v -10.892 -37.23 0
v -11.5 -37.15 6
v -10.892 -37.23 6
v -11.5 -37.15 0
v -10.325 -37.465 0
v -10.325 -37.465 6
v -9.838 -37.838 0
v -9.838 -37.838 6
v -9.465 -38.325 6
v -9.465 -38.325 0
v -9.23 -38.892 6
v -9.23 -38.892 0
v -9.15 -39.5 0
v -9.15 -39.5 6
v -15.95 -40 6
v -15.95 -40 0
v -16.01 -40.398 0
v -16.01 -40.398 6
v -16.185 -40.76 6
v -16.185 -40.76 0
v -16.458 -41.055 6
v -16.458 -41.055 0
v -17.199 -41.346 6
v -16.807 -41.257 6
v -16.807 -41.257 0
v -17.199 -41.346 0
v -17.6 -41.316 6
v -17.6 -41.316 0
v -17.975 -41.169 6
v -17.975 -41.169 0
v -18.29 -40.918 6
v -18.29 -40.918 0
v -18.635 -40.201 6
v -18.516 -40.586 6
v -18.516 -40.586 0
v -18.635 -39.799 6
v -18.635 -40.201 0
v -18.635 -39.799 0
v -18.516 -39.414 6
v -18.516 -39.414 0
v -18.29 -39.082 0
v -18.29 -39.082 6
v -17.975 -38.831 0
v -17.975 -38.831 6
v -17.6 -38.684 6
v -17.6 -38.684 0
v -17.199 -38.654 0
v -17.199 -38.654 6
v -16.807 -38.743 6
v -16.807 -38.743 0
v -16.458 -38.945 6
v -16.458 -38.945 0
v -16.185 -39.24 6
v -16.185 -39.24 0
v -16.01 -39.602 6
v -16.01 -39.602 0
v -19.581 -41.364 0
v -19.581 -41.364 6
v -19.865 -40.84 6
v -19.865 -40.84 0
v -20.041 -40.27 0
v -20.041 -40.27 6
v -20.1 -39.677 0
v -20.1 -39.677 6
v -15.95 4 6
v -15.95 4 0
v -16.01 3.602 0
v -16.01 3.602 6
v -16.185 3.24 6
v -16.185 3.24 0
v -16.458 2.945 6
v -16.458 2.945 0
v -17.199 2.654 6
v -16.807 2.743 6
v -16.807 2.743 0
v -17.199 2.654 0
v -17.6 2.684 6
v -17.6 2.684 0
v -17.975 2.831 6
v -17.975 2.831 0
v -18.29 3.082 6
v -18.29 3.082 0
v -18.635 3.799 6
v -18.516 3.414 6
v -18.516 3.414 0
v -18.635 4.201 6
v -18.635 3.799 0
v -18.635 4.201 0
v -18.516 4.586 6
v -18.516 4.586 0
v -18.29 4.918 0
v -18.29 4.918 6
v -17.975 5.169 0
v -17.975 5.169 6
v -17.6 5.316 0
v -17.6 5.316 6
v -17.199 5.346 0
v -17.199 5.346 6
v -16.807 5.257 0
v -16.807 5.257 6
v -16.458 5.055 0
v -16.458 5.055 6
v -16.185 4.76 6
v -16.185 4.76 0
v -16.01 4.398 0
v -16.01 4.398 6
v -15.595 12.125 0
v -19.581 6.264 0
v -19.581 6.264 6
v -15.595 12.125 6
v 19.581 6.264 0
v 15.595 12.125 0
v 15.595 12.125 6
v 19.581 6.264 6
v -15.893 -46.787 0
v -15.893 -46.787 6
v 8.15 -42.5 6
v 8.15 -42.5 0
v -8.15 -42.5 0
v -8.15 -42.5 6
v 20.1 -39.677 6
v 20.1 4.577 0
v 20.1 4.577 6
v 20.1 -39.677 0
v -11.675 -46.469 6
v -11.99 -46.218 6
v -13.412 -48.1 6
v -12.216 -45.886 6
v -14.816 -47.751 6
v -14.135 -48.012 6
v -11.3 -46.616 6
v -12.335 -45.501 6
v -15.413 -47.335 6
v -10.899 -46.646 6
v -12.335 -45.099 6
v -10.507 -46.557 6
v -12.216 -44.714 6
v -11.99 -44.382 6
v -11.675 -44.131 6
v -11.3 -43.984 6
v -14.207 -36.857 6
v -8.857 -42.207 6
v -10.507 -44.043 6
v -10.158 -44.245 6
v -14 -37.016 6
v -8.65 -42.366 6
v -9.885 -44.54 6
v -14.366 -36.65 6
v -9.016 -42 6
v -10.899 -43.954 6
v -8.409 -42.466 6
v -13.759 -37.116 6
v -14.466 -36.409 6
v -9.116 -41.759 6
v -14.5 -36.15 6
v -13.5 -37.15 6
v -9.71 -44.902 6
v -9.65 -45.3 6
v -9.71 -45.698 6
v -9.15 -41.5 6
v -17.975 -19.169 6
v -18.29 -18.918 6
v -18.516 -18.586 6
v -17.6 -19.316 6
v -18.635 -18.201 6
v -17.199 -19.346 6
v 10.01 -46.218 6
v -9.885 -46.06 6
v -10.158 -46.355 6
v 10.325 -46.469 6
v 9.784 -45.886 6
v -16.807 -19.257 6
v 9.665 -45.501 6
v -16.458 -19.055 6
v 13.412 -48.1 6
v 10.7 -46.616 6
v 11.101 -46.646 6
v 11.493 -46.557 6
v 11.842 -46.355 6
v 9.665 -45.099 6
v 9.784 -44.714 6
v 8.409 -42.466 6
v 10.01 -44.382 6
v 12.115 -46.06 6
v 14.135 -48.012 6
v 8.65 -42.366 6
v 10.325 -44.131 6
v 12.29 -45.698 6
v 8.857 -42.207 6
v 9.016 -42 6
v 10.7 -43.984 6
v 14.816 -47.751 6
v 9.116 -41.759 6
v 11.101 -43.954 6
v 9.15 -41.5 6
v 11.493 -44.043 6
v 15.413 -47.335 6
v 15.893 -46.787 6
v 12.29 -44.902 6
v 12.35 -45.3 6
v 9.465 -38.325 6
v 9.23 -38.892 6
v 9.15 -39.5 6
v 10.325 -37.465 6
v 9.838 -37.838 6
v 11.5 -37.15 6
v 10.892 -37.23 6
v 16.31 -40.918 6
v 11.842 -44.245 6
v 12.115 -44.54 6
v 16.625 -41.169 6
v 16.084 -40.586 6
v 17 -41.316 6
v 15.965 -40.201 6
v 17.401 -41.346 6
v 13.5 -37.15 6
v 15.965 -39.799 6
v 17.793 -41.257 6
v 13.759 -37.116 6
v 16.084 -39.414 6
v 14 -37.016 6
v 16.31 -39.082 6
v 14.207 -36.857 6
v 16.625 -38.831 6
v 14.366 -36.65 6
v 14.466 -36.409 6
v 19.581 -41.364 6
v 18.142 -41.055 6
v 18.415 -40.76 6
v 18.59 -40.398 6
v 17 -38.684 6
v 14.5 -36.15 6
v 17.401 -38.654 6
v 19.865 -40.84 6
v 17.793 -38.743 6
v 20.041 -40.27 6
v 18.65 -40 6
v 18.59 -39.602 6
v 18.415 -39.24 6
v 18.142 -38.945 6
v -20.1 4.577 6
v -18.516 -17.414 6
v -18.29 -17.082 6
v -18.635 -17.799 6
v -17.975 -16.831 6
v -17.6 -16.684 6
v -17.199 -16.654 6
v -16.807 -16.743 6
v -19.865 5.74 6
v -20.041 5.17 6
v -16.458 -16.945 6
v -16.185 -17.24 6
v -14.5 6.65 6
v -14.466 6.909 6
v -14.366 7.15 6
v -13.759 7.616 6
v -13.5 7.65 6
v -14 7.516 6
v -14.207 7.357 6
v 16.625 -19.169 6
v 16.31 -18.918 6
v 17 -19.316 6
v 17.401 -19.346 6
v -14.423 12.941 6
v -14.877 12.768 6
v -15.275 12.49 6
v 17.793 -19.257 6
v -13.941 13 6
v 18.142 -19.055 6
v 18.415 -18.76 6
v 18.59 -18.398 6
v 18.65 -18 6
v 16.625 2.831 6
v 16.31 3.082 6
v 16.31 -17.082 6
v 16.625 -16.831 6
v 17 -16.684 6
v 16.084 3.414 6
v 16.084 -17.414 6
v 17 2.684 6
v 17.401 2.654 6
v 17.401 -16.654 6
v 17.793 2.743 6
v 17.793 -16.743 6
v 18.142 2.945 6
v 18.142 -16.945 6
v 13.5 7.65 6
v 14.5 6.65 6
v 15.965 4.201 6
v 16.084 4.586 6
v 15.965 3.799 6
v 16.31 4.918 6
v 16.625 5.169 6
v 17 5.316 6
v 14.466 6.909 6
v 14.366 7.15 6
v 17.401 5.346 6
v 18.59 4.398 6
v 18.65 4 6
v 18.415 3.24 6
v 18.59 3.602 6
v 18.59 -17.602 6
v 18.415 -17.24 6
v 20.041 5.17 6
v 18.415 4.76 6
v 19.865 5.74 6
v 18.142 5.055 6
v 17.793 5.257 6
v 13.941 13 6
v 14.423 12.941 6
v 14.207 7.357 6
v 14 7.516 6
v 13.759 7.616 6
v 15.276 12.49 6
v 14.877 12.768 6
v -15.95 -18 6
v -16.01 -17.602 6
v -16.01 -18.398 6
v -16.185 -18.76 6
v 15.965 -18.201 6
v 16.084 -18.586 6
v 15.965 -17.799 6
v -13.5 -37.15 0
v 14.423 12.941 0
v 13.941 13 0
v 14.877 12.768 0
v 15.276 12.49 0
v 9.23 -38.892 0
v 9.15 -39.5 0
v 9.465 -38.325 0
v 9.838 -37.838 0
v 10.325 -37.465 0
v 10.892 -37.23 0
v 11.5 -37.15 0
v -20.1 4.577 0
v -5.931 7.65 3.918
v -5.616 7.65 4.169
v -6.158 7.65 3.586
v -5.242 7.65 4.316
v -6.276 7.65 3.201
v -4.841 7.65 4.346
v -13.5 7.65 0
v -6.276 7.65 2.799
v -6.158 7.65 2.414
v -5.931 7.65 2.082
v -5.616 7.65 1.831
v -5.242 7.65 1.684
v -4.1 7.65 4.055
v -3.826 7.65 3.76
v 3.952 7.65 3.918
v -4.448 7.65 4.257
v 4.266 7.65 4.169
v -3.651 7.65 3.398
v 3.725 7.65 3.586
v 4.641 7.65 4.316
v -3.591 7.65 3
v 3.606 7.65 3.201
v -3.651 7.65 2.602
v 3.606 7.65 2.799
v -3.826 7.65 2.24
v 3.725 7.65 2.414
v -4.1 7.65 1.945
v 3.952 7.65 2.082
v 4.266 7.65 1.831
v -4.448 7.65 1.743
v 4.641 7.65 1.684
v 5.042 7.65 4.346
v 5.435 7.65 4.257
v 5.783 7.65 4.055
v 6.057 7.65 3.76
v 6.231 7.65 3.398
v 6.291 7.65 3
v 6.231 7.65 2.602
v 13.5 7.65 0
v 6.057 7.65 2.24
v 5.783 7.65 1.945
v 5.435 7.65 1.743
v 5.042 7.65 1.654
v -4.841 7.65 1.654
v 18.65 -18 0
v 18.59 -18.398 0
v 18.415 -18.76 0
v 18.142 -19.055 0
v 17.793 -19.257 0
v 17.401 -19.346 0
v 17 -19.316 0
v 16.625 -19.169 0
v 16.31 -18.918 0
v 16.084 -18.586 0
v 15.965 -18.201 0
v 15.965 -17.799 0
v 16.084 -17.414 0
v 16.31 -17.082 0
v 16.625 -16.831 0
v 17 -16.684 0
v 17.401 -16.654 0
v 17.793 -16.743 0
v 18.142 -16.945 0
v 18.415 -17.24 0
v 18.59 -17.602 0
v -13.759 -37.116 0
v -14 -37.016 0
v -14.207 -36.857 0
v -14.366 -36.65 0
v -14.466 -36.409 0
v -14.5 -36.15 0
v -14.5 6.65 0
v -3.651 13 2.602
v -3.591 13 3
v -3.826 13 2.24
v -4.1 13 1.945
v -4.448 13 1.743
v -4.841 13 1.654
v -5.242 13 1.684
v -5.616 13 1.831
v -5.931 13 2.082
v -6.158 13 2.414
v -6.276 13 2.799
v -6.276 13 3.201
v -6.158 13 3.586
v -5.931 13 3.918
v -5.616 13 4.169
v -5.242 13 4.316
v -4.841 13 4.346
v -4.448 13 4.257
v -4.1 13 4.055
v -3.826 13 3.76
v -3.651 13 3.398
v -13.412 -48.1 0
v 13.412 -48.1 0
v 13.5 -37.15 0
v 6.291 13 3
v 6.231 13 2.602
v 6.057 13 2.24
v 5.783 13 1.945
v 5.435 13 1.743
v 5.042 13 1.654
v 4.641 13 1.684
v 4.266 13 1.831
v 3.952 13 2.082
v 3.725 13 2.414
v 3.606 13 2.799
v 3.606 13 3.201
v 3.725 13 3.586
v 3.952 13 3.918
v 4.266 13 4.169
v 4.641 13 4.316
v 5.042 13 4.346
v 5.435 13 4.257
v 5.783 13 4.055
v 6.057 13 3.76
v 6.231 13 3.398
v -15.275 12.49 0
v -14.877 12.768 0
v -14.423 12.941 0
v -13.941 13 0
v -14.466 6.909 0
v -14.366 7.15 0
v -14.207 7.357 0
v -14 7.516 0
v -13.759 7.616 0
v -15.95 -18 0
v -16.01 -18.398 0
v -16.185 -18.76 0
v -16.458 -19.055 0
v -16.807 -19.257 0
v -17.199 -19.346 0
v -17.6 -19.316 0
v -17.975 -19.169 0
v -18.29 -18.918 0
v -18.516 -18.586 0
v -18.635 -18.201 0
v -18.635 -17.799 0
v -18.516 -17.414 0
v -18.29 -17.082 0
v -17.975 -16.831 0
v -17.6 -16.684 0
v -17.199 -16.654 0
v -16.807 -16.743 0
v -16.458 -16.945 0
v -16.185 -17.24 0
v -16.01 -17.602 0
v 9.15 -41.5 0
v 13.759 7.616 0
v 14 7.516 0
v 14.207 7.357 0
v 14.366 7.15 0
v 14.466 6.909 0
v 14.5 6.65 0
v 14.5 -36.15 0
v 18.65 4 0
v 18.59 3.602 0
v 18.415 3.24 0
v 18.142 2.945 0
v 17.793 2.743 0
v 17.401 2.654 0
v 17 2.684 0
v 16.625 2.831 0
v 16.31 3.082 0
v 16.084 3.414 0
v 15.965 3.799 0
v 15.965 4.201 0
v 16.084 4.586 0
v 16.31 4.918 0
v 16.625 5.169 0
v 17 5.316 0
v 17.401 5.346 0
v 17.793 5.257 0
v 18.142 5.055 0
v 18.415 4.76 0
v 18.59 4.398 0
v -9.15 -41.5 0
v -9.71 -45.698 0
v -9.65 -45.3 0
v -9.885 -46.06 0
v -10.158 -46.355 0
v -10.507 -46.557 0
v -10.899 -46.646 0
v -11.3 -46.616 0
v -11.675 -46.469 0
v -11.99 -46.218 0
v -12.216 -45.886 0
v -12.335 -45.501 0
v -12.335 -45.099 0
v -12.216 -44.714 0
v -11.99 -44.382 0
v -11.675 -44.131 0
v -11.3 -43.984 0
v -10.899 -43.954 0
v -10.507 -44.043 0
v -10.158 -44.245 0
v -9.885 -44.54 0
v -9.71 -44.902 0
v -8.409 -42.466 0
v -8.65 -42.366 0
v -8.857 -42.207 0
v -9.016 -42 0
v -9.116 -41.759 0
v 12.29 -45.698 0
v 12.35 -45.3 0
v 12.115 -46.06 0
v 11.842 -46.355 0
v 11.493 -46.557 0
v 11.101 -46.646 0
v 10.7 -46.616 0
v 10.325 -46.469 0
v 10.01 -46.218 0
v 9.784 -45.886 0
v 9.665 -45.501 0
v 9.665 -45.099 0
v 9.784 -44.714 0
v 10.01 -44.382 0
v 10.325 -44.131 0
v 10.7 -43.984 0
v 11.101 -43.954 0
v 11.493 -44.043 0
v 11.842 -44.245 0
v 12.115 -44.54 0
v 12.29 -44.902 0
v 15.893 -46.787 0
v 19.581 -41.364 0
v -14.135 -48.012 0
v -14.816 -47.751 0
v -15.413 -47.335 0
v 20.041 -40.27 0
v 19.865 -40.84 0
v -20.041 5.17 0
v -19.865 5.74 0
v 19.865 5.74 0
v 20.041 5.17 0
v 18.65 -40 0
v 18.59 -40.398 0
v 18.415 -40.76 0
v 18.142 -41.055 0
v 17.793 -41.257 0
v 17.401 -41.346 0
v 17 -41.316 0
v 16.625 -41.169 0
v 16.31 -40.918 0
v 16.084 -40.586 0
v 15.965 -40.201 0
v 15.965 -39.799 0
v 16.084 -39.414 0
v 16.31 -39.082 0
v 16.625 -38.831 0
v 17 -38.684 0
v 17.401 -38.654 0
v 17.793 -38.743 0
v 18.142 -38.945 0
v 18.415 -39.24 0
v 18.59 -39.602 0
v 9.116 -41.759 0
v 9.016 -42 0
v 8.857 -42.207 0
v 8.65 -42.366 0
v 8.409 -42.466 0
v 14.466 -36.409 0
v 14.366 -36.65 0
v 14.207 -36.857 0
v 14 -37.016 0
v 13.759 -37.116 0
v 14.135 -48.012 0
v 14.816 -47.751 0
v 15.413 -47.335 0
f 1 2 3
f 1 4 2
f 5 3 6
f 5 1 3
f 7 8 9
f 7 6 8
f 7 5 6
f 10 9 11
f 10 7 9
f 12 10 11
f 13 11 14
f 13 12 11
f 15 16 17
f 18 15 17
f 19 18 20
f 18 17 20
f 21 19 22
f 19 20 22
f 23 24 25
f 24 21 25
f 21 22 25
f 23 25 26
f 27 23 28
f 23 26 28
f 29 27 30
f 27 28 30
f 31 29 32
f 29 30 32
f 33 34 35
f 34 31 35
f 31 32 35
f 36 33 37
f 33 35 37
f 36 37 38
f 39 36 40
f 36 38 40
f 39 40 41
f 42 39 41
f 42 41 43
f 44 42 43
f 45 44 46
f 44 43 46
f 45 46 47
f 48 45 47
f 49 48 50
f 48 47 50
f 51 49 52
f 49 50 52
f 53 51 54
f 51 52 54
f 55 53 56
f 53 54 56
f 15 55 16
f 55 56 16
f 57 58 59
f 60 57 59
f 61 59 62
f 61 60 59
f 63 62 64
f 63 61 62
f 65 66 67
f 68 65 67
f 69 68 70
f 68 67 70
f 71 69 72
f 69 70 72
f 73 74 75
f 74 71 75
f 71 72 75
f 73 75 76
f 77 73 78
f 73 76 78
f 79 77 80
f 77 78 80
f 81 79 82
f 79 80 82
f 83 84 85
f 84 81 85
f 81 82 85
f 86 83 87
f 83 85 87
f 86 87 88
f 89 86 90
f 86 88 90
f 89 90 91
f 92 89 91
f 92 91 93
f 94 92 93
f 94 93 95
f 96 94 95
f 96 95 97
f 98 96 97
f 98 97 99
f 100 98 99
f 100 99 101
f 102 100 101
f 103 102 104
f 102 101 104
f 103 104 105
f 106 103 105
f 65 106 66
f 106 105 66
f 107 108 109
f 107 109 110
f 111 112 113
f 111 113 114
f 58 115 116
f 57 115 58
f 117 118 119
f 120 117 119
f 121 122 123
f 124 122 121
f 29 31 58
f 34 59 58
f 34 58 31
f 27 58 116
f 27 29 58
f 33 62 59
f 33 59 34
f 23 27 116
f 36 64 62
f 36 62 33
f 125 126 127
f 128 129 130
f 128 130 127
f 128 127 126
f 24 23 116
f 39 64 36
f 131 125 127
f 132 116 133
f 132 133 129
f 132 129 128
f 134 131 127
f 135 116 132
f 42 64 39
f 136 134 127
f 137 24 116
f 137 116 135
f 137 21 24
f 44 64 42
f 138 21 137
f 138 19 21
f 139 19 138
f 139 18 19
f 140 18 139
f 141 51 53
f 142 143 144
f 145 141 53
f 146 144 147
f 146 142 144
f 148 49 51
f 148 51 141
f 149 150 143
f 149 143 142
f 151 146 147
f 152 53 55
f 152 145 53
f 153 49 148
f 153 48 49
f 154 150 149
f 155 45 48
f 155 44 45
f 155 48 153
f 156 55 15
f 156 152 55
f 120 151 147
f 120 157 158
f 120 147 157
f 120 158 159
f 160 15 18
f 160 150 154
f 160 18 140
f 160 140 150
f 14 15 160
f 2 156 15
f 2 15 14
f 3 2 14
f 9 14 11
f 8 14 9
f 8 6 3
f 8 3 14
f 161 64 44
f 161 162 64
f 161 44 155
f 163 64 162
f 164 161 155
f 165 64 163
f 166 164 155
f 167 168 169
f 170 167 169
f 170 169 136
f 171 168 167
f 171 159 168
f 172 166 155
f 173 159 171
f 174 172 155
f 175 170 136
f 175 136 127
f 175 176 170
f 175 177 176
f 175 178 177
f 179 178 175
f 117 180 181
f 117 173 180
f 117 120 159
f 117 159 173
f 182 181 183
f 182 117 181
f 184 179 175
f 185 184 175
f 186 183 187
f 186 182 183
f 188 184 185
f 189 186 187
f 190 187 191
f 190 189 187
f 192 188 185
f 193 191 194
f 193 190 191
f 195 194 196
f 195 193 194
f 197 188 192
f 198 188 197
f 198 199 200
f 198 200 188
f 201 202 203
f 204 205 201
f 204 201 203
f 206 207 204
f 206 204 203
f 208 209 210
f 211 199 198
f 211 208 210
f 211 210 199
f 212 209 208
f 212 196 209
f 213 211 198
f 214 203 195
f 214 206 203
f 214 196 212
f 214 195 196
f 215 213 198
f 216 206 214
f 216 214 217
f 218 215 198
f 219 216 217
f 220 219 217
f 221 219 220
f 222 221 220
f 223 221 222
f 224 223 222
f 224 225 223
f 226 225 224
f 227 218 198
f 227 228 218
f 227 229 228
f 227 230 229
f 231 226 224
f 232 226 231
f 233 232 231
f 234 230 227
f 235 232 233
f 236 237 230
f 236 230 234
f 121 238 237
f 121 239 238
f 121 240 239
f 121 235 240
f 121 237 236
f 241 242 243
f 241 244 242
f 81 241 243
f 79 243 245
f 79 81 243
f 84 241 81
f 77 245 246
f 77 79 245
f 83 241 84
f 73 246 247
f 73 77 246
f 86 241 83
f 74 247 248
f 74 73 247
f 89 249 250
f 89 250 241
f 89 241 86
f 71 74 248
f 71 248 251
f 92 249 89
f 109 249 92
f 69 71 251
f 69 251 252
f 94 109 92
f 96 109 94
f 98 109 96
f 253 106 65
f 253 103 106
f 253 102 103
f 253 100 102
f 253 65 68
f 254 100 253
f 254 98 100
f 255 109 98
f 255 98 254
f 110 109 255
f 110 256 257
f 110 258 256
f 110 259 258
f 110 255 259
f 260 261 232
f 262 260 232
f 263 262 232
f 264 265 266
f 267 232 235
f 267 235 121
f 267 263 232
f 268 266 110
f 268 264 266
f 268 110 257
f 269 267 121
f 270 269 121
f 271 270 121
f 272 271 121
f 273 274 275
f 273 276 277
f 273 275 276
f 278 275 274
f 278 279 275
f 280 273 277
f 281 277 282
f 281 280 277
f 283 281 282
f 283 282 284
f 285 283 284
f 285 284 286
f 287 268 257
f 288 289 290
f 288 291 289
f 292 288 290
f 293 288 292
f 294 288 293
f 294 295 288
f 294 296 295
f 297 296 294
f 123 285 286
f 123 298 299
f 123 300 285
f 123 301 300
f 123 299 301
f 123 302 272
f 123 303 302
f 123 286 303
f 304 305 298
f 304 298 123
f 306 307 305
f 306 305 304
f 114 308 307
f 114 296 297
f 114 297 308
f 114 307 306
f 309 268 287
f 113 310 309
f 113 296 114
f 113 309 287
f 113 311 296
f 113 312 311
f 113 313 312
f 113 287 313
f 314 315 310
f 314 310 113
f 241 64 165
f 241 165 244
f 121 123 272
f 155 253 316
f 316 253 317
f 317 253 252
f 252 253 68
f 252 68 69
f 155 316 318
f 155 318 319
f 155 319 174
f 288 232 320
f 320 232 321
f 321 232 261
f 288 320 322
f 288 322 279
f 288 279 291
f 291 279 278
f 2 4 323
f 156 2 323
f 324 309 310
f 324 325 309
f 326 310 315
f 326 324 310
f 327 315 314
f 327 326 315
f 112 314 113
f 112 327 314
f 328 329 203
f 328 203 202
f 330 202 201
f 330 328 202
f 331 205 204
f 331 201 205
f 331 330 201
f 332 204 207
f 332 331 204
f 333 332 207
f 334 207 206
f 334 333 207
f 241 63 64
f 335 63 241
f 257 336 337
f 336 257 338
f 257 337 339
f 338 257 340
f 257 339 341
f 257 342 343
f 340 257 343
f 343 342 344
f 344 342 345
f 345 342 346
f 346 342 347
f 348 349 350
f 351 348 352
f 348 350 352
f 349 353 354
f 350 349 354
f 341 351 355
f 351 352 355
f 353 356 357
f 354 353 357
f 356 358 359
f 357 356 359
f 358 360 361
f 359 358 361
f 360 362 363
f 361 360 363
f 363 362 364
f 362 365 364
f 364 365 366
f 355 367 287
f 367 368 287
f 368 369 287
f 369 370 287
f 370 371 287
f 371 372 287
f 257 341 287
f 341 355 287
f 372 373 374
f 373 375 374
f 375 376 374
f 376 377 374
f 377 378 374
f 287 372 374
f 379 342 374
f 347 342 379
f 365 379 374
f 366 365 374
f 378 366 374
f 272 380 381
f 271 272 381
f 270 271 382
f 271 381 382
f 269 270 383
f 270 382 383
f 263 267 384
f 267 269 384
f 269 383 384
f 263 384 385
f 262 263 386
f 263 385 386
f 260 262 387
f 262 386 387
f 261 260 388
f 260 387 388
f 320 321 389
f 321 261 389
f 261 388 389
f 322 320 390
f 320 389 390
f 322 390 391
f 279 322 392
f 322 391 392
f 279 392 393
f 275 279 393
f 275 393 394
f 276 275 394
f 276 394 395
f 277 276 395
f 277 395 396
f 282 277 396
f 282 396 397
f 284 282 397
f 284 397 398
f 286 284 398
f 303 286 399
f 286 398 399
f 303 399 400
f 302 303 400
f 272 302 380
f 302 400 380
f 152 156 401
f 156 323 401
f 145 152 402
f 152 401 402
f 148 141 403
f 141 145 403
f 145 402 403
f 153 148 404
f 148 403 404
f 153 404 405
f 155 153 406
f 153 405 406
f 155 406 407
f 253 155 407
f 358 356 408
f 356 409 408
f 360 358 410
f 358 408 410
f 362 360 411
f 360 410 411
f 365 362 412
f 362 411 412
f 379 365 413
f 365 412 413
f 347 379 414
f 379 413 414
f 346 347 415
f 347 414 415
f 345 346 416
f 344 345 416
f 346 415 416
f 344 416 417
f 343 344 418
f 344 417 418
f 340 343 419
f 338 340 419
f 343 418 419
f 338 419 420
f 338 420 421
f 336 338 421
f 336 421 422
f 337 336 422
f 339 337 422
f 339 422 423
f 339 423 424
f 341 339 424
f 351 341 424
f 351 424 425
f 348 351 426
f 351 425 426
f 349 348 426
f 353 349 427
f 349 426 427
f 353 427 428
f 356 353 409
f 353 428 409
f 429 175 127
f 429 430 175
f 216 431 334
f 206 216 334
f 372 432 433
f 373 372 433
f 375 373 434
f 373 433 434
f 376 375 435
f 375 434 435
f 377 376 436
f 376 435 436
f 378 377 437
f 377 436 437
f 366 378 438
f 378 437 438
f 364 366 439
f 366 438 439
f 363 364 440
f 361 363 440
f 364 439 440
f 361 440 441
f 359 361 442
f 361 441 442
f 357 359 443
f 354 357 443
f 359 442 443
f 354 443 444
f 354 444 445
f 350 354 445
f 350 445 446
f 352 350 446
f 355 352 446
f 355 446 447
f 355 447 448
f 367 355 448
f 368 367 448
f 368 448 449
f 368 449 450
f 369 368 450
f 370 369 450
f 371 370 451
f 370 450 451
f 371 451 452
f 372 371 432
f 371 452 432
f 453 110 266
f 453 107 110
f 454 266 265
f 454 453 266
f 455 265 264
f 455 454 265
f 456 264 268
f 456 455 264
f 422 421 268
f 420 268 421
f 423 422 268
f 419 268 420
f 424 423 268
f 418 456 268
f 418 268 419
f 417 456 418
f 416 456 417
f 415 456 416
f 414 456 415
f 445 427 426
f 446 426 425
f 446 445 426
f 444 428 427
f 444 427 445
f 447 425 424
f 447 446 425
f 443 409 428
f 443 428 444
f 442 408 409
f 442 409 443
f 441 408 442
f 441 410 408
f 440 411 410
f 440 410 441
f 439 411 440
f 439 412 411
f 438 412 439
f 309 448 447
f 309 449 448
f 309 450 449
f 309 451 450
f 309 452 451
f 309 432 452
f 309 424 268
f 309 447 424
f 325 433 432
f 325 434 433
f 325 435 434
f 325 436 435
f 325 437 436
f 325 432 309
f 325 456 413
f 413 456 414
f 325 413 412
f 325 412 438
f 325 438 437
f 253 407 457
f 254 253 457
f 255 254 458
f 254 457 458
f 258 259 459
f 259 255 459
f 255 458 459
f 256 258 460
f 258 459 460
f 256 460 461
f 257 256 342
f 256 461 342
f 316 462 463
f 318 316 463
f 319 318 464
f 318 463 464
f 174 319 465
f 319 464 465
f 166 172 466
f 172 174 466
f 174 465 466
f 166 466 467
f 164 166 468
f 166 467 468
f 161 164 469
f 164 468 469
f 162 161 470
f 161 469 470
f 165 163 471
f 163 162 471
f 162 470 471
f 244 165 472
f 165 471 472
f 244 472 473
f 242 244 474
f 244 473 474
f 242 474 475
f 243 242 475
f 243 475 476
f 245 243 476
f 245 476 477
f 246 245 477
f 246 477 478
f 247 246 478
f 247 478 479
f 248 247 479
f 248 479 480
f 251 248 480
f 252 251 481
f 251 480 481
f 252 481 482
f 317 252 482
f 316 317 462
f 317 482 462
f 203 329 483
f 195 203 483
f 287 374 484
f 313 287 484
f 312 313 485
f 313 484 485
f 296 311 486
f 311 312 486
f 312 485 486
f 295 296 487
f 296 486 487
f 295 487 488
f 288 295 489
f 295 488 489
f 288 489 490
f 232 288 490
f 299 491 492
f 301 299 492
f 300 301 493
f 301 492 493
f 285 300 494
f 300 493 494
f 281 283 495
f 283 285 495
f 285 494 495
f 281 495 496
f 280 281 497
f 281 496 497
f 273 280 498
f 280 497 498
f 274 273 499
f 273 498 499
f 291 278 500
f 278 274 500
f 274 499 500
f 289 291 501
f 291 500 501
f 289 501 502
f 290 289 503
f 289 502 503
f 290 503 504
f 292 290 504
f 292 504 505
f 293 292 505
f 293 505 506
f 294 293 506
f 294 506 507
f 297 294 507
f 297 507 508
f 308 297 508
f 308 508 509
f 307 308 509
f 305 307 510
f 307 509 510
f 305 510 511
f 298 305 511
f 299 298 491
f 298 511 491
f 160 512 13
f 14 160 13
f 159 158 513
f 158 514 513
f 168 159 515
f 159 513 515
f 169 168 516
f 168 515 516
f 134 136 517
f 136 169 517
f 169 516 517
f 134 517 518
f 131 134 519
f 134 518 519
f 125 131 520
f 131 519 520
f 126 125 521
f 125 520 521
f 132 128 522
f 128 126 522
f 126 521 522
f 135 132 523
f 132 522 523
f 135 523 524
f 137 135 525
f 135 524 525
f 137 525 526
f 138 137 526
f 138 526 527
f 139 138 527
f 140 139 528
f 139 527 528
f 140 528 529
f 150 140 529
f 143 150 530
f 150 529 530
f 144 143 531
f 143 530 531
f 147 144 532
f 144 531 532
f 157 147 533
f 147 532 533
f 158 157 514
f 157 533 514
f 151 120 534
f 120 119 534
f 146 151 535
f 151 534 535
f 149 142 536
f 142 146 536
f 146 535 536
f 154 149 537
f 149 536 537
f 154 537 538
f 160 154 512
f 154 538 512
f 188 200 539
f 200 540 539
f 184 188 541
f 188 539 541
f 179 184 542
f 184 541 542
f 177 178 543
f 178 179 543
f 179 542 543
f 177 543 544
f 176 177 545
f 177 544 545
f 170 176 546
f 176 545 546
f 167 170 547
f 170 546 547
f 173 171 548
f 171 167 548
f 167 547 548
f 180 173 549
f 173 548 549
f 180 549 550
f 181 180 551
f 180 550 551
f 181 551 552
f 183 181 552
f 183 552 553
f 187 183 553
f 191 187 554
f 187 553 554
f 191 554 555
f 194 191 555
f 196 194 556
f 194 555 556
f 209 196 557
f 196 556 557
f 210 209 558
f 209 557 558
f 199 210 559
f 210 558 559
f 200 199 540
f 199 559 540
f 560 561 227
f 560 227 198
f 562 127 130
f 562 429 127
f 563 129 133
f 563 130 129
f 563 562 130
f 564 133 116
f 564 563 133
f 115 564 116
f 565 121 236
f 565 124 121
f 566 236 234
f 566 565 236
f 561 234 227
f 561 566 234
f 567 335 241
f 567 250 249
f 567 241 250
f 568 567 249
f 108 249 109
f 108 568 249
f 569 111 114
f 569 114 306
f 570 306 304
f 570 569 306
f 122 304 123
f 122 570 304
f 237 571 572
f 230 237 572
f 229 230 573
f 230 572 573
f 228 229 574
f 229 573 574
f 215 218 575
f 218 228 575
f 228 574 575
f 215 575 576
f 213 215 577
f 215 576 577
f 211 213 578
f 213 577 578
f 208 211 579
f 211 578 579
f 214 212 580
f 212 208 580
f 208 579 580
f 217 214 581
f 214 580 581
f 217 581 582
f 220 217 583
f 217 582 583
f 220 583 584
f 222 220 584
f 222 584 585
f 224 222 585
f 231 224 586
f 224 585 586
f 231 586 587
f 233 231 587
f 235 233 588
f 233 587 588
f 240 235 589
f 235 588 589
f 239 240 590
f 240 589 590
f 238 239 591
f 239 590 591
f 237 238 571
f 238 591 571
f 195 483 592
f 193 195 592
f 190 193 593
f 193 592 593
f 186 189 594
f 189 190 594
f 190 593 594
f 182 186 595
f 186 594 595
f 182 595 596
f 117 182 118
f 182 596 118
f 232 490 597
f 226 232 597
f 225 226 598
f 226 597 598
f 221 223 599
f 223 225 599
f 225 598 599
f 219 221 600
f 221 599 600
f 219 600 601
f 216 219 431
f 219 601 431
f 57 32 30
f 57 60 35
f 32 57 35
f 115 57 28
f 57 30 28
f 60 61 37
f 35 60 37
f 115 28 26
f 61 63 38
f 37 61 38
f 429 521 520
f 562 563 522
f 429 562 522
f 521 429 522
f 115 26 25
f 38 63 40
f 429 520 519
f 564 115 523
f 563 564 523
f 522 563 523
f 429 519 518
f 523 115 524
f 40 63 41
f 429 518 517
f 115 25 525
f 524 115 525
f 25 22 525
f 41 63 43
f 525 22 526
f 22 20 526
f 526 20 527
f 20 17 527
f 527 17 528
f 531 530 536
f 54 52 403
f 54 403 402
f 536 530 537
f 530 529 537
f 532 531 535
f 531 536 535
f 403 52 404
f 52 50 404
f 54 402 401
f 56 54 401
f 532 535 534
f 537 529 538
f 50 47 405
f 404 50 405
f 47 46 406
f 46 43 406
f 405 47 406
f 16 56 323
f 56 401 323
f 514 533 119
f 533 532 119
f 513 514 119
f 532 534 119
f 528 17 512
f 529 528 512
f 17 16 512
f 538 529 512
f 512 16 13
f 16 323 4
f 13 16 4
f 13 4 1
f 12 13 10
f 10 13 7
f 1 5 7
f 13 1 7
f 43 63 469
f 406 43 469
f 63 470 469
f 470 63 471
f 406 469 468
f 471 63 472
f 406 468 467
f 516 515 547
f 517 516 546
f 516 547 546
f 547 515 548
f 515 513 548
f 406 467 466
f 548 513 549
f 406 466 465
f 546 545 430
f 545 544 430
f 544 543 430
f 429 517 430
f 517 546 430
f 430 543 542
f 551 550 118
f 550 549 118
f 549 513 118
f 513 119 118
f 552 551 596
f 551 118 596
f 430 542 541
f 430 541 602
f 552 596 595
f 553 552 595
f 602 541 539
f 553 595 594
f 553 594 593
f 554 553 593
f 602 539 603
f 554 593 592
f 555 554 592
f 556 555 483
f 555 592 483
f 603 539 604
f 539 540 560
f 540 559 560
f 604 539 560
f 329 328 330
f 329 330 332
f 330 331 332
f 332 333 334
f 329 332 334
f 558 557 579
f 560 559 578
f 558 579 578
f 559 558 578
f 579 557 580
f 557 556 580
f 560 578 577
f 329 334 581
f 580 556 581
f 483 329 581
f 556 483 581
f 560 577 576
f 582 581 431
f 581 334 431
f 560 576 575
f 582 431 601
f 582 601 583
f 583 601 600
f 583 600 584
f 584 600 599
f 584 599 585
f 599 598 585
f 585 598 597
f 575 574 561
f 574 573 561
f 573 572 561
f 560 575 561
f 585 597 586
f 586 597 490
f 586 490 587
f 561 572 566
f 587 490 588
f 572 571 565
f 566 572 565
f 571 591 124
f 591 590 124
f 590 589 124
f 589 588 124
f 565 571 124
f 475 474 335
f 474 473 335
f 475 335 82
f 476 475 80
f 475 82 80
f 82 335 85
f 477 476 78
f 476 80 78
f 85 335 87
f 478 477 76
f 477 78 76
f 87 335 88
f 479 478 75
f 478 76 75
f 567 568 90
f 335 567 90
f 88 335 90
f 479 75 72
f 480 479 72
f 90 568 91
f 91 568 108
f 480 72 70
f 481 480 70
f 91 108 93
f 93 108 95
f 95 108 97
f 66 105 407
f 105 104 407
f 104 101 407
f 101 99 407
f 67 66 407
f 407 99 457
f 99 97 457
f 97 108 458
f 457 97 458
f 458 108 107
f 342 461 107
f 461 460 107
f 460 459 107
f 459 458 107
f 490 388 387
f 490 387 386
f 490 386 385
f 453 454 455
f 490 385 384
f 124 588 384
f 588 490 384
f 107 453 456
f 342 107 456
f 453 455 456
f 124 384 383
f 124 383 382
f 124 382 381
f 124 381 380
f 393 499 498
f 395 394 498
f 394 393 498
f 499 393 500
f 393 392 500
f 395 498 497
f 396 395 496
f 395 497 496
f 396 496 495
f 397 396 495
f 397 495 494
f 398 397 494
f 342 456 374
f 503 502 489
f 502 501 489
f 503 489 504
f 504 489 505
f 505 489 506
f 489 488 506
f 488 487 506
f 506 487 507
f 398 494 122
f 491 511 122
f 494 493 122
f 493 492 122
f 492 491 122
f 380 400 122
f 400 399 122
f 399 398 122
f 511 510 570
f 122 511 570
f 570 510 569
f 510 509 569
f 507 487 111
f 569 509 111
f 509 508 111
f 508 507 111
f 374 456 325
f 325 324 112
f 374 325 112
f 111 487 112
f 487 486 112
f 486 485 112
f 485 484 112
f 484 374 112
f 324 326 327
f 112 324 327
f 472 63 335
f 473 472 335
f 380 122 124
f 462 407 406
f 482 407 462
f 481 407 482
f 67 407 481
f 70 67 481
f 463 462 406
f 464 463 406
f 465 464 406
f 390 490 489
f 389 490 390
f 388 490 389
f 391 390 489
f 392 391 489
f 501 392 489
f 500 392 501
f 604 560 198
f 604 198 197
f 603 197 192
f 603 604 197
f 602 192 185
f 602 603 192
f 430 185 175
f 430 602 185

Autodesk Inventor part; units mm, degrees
ref_plane "YZ Plane" through (0, 0, 0) normal (1, 0, 0) x (0, 1, 0)
ref_plane "XZ Plane" through (0, 0, 0) normal (0, 1, 0) x (-1, 0, 0)
ref_plane "XY Plane" through (0, 0, 0) normal (0, 0, 1) x (1, 0, 0)
ref_plane "작업 평면1" through (0, 0, 0) normal (0, 0, 1) x (1, 0, 0)
sketch "스케치1" plane through (0, 0, 0) normal (0, 0, 1) x (1, 0, 0)
  arc A0 (-19.5808, 6.2636) -> (-20.1, 4.5766) centre (-17.1, 4.5766) ccw projected
  line L0 (-20.1, -39.6766) -> (-20.1, 4.5766) projected
  arc A1 (-20.1, -39.6766) -> (-19.5808, -41.3636) centre (-17.1, -39.6766) ccw projected
  line L1 (-15.8929, -46.7869) -> (-19.5808, -41.3636) projected
  arc A2 (-15.8929, -46.7869) -> (-13.4121, -48.1) centre (-13.4121, -45.1) ccw projected
  line L2 (13.4121, -48.1) -> (-13.4121, -48.1) projected
  arc A3 (13.4121, -48.1) -> (15.8929, -46.7869) centre (13.4121, -45.1) ccw projected
  line L3 (19.5808, -41.3636) -> (15.8929, -46.7869) projected
  arc A4 (19.5808, -41.3636) -> (20.1, -39.6766) centre (17.1, -39.6766) ccw projected
  line L4 (20.1, 4.5766) -> (20.1, -39.6766) projected
  arc A5 (20.1, 4.5766) -> (19.5808, 6.2636) centre (17.1, 4.5766) ccw projected
  line L5 (15.5953, 12.1246) -> (19.5808, 6.2636) projected
  arc A6 (15.5953, 12.1246) -> (13.9414, 13) centre (13.9414, 11) ccw projected
  line L6 (7.65, 13) -> (13.9414, 13) projected
  arc A7 (9.15, 11.5) -> (7.65, 13) centre (7.65, 11.5) ccw projected
  line L7 (9.15, 11.5) -> (9.15, 10) projected
  arc A8 (9.15, 10) -> (11.5, 7.65) centre (11.5, 10) ccw projected
  line L8 (11.5, 7.65) -> (13.5, 7.65) projected
  arc A9 (14.5, 6.65) -> (13.5, 7.65) centre (13.5, 6.65) ccw projected
  line L9 (14.5, 6.65) -> (14.5, -36.15) projected
  arc A10 (13.5, -37.15) -> (14.5, -36.15) centre (13.5, -36.15) ccw projected
  line L10 (13.5, -37.15) -> (11.5, -37.15) projected
  arc A11 (11.5, -37.15) -> (9.15, -39.5) centre (11.5, -39.5) ccw projected
  line L11 (9.15, -39.5) -> (9.15, -41.5) projected
  arc A12 (8.15, -42.5) -> (9.15, -41.5) centre (8.15, -41.5) ccw projected
  line L12 (8.15, -42.5) -> (-8.15, -42.5) projected
  arc A13 (-9.15, -41.5) -> (-8.15, -42.5) centre (-8.15, -41.5) ccw projected
  line L13 (-9.15, -41.5) -> (-9.15, -39.5) projected
  arc A14 (-9.15, -39.5) -> (-11.5, -37.15) centre (-11.5, -39.5) ccw projected
  line L14 (-11.5, -37.15) -> (-13.5, -37.15) projected
  arc A15 (-14.5, -36.15) -> (-13.5, -37.15) centre (-13.5, -36.15) ccw projected
  line L15 (-14.5, -36.15) -> (-14.5, 6.65) projected
  arc A16 (-13.5, 7.65) -> (-14.5, 6.65) centre (-13.5, 6.65) ccw projected
  line L16 (-13.5, 7.65) -> (-11.5, 7.65) projected
  arc A17 (-11.5, 7.65) -> (-9.15, 10) centre (-11.5, 10) ccw projected
  line L17 (-9.15, 10) -> (-9.15, 11.5) projected
  arc A18 (-7.65, 13) -> (-9.15, 11.5) centre (-7.65, 11.5) ccw projected
  line L18 (-13.9414, 13) -> (-7.65, 13) projected
  arc A19 (-13.9414, 13) -> (-15.5953, 12.1246) centre (-13.9414, 11) ccw projected
  line L19 (-19.5808, 6.2636) -> (-15.5953, 12.1246) projected
  circle A20 centre (17.3, 4) radius 1.35 projected
  circle A21 centre (17.3, -18) radius 1.35 projected
  circle A22 centre (11, -45.3) radius 1.35 projected
  circle A23 centre (-17.3, 4) radius 1.35 projected
  circle A24 centre (-17.3, -18) radius 1.35 projected
  circle A25 centre (-11, -45.3) radius 1.35 projected
  circle A26 centre (17.3, -40) radius 1.35 projected
  circle A27 centre (-17.3, -40) radius 1.35 projected
  line L20 (-11.5, 7.65) -> (11.5, 7.65)
  line L21 (11.5, 7.65) -> (11.5, 13)
  line L22 (11.5, 13) -> (-11.5, 13)
  line L23 (-11.5, 13) -> (-11.5, 7.65)
  point P0 (0, 0)
extrude "돌출1" add sketch "스케치1" along normal blind 6 contours L19 A19 L18 L23 L16 A16 L15 A15 L14 A14 L13 A13 L12 A12 L11 A11 L10 A10 L9 A9 L8 L21 L6 A6 L5 A5 L4 A4 L3 A3 L2 A2 L1 A1 L0 A0 | L18 A18 L17 A17 L23 | L22 A7 L7 A8 L20 A17 L17 A18 | L6 L21 A8 L7 A7
sketch "스케치2" plane through (-13.9414, 13, 0) normal (0, 1, 0) x (1, 0, 0)
  circle A0 centre (18.8828, -3) radius 1.35 projected
  circle A1 centre (9, -3) radius 1.35 projected
  point P0 (13.9414, 0)
extrude "돌출2" cut sketch "스케치2" against normal blind 6
properties part number "_inner" material "PMMA 플라스틱"
